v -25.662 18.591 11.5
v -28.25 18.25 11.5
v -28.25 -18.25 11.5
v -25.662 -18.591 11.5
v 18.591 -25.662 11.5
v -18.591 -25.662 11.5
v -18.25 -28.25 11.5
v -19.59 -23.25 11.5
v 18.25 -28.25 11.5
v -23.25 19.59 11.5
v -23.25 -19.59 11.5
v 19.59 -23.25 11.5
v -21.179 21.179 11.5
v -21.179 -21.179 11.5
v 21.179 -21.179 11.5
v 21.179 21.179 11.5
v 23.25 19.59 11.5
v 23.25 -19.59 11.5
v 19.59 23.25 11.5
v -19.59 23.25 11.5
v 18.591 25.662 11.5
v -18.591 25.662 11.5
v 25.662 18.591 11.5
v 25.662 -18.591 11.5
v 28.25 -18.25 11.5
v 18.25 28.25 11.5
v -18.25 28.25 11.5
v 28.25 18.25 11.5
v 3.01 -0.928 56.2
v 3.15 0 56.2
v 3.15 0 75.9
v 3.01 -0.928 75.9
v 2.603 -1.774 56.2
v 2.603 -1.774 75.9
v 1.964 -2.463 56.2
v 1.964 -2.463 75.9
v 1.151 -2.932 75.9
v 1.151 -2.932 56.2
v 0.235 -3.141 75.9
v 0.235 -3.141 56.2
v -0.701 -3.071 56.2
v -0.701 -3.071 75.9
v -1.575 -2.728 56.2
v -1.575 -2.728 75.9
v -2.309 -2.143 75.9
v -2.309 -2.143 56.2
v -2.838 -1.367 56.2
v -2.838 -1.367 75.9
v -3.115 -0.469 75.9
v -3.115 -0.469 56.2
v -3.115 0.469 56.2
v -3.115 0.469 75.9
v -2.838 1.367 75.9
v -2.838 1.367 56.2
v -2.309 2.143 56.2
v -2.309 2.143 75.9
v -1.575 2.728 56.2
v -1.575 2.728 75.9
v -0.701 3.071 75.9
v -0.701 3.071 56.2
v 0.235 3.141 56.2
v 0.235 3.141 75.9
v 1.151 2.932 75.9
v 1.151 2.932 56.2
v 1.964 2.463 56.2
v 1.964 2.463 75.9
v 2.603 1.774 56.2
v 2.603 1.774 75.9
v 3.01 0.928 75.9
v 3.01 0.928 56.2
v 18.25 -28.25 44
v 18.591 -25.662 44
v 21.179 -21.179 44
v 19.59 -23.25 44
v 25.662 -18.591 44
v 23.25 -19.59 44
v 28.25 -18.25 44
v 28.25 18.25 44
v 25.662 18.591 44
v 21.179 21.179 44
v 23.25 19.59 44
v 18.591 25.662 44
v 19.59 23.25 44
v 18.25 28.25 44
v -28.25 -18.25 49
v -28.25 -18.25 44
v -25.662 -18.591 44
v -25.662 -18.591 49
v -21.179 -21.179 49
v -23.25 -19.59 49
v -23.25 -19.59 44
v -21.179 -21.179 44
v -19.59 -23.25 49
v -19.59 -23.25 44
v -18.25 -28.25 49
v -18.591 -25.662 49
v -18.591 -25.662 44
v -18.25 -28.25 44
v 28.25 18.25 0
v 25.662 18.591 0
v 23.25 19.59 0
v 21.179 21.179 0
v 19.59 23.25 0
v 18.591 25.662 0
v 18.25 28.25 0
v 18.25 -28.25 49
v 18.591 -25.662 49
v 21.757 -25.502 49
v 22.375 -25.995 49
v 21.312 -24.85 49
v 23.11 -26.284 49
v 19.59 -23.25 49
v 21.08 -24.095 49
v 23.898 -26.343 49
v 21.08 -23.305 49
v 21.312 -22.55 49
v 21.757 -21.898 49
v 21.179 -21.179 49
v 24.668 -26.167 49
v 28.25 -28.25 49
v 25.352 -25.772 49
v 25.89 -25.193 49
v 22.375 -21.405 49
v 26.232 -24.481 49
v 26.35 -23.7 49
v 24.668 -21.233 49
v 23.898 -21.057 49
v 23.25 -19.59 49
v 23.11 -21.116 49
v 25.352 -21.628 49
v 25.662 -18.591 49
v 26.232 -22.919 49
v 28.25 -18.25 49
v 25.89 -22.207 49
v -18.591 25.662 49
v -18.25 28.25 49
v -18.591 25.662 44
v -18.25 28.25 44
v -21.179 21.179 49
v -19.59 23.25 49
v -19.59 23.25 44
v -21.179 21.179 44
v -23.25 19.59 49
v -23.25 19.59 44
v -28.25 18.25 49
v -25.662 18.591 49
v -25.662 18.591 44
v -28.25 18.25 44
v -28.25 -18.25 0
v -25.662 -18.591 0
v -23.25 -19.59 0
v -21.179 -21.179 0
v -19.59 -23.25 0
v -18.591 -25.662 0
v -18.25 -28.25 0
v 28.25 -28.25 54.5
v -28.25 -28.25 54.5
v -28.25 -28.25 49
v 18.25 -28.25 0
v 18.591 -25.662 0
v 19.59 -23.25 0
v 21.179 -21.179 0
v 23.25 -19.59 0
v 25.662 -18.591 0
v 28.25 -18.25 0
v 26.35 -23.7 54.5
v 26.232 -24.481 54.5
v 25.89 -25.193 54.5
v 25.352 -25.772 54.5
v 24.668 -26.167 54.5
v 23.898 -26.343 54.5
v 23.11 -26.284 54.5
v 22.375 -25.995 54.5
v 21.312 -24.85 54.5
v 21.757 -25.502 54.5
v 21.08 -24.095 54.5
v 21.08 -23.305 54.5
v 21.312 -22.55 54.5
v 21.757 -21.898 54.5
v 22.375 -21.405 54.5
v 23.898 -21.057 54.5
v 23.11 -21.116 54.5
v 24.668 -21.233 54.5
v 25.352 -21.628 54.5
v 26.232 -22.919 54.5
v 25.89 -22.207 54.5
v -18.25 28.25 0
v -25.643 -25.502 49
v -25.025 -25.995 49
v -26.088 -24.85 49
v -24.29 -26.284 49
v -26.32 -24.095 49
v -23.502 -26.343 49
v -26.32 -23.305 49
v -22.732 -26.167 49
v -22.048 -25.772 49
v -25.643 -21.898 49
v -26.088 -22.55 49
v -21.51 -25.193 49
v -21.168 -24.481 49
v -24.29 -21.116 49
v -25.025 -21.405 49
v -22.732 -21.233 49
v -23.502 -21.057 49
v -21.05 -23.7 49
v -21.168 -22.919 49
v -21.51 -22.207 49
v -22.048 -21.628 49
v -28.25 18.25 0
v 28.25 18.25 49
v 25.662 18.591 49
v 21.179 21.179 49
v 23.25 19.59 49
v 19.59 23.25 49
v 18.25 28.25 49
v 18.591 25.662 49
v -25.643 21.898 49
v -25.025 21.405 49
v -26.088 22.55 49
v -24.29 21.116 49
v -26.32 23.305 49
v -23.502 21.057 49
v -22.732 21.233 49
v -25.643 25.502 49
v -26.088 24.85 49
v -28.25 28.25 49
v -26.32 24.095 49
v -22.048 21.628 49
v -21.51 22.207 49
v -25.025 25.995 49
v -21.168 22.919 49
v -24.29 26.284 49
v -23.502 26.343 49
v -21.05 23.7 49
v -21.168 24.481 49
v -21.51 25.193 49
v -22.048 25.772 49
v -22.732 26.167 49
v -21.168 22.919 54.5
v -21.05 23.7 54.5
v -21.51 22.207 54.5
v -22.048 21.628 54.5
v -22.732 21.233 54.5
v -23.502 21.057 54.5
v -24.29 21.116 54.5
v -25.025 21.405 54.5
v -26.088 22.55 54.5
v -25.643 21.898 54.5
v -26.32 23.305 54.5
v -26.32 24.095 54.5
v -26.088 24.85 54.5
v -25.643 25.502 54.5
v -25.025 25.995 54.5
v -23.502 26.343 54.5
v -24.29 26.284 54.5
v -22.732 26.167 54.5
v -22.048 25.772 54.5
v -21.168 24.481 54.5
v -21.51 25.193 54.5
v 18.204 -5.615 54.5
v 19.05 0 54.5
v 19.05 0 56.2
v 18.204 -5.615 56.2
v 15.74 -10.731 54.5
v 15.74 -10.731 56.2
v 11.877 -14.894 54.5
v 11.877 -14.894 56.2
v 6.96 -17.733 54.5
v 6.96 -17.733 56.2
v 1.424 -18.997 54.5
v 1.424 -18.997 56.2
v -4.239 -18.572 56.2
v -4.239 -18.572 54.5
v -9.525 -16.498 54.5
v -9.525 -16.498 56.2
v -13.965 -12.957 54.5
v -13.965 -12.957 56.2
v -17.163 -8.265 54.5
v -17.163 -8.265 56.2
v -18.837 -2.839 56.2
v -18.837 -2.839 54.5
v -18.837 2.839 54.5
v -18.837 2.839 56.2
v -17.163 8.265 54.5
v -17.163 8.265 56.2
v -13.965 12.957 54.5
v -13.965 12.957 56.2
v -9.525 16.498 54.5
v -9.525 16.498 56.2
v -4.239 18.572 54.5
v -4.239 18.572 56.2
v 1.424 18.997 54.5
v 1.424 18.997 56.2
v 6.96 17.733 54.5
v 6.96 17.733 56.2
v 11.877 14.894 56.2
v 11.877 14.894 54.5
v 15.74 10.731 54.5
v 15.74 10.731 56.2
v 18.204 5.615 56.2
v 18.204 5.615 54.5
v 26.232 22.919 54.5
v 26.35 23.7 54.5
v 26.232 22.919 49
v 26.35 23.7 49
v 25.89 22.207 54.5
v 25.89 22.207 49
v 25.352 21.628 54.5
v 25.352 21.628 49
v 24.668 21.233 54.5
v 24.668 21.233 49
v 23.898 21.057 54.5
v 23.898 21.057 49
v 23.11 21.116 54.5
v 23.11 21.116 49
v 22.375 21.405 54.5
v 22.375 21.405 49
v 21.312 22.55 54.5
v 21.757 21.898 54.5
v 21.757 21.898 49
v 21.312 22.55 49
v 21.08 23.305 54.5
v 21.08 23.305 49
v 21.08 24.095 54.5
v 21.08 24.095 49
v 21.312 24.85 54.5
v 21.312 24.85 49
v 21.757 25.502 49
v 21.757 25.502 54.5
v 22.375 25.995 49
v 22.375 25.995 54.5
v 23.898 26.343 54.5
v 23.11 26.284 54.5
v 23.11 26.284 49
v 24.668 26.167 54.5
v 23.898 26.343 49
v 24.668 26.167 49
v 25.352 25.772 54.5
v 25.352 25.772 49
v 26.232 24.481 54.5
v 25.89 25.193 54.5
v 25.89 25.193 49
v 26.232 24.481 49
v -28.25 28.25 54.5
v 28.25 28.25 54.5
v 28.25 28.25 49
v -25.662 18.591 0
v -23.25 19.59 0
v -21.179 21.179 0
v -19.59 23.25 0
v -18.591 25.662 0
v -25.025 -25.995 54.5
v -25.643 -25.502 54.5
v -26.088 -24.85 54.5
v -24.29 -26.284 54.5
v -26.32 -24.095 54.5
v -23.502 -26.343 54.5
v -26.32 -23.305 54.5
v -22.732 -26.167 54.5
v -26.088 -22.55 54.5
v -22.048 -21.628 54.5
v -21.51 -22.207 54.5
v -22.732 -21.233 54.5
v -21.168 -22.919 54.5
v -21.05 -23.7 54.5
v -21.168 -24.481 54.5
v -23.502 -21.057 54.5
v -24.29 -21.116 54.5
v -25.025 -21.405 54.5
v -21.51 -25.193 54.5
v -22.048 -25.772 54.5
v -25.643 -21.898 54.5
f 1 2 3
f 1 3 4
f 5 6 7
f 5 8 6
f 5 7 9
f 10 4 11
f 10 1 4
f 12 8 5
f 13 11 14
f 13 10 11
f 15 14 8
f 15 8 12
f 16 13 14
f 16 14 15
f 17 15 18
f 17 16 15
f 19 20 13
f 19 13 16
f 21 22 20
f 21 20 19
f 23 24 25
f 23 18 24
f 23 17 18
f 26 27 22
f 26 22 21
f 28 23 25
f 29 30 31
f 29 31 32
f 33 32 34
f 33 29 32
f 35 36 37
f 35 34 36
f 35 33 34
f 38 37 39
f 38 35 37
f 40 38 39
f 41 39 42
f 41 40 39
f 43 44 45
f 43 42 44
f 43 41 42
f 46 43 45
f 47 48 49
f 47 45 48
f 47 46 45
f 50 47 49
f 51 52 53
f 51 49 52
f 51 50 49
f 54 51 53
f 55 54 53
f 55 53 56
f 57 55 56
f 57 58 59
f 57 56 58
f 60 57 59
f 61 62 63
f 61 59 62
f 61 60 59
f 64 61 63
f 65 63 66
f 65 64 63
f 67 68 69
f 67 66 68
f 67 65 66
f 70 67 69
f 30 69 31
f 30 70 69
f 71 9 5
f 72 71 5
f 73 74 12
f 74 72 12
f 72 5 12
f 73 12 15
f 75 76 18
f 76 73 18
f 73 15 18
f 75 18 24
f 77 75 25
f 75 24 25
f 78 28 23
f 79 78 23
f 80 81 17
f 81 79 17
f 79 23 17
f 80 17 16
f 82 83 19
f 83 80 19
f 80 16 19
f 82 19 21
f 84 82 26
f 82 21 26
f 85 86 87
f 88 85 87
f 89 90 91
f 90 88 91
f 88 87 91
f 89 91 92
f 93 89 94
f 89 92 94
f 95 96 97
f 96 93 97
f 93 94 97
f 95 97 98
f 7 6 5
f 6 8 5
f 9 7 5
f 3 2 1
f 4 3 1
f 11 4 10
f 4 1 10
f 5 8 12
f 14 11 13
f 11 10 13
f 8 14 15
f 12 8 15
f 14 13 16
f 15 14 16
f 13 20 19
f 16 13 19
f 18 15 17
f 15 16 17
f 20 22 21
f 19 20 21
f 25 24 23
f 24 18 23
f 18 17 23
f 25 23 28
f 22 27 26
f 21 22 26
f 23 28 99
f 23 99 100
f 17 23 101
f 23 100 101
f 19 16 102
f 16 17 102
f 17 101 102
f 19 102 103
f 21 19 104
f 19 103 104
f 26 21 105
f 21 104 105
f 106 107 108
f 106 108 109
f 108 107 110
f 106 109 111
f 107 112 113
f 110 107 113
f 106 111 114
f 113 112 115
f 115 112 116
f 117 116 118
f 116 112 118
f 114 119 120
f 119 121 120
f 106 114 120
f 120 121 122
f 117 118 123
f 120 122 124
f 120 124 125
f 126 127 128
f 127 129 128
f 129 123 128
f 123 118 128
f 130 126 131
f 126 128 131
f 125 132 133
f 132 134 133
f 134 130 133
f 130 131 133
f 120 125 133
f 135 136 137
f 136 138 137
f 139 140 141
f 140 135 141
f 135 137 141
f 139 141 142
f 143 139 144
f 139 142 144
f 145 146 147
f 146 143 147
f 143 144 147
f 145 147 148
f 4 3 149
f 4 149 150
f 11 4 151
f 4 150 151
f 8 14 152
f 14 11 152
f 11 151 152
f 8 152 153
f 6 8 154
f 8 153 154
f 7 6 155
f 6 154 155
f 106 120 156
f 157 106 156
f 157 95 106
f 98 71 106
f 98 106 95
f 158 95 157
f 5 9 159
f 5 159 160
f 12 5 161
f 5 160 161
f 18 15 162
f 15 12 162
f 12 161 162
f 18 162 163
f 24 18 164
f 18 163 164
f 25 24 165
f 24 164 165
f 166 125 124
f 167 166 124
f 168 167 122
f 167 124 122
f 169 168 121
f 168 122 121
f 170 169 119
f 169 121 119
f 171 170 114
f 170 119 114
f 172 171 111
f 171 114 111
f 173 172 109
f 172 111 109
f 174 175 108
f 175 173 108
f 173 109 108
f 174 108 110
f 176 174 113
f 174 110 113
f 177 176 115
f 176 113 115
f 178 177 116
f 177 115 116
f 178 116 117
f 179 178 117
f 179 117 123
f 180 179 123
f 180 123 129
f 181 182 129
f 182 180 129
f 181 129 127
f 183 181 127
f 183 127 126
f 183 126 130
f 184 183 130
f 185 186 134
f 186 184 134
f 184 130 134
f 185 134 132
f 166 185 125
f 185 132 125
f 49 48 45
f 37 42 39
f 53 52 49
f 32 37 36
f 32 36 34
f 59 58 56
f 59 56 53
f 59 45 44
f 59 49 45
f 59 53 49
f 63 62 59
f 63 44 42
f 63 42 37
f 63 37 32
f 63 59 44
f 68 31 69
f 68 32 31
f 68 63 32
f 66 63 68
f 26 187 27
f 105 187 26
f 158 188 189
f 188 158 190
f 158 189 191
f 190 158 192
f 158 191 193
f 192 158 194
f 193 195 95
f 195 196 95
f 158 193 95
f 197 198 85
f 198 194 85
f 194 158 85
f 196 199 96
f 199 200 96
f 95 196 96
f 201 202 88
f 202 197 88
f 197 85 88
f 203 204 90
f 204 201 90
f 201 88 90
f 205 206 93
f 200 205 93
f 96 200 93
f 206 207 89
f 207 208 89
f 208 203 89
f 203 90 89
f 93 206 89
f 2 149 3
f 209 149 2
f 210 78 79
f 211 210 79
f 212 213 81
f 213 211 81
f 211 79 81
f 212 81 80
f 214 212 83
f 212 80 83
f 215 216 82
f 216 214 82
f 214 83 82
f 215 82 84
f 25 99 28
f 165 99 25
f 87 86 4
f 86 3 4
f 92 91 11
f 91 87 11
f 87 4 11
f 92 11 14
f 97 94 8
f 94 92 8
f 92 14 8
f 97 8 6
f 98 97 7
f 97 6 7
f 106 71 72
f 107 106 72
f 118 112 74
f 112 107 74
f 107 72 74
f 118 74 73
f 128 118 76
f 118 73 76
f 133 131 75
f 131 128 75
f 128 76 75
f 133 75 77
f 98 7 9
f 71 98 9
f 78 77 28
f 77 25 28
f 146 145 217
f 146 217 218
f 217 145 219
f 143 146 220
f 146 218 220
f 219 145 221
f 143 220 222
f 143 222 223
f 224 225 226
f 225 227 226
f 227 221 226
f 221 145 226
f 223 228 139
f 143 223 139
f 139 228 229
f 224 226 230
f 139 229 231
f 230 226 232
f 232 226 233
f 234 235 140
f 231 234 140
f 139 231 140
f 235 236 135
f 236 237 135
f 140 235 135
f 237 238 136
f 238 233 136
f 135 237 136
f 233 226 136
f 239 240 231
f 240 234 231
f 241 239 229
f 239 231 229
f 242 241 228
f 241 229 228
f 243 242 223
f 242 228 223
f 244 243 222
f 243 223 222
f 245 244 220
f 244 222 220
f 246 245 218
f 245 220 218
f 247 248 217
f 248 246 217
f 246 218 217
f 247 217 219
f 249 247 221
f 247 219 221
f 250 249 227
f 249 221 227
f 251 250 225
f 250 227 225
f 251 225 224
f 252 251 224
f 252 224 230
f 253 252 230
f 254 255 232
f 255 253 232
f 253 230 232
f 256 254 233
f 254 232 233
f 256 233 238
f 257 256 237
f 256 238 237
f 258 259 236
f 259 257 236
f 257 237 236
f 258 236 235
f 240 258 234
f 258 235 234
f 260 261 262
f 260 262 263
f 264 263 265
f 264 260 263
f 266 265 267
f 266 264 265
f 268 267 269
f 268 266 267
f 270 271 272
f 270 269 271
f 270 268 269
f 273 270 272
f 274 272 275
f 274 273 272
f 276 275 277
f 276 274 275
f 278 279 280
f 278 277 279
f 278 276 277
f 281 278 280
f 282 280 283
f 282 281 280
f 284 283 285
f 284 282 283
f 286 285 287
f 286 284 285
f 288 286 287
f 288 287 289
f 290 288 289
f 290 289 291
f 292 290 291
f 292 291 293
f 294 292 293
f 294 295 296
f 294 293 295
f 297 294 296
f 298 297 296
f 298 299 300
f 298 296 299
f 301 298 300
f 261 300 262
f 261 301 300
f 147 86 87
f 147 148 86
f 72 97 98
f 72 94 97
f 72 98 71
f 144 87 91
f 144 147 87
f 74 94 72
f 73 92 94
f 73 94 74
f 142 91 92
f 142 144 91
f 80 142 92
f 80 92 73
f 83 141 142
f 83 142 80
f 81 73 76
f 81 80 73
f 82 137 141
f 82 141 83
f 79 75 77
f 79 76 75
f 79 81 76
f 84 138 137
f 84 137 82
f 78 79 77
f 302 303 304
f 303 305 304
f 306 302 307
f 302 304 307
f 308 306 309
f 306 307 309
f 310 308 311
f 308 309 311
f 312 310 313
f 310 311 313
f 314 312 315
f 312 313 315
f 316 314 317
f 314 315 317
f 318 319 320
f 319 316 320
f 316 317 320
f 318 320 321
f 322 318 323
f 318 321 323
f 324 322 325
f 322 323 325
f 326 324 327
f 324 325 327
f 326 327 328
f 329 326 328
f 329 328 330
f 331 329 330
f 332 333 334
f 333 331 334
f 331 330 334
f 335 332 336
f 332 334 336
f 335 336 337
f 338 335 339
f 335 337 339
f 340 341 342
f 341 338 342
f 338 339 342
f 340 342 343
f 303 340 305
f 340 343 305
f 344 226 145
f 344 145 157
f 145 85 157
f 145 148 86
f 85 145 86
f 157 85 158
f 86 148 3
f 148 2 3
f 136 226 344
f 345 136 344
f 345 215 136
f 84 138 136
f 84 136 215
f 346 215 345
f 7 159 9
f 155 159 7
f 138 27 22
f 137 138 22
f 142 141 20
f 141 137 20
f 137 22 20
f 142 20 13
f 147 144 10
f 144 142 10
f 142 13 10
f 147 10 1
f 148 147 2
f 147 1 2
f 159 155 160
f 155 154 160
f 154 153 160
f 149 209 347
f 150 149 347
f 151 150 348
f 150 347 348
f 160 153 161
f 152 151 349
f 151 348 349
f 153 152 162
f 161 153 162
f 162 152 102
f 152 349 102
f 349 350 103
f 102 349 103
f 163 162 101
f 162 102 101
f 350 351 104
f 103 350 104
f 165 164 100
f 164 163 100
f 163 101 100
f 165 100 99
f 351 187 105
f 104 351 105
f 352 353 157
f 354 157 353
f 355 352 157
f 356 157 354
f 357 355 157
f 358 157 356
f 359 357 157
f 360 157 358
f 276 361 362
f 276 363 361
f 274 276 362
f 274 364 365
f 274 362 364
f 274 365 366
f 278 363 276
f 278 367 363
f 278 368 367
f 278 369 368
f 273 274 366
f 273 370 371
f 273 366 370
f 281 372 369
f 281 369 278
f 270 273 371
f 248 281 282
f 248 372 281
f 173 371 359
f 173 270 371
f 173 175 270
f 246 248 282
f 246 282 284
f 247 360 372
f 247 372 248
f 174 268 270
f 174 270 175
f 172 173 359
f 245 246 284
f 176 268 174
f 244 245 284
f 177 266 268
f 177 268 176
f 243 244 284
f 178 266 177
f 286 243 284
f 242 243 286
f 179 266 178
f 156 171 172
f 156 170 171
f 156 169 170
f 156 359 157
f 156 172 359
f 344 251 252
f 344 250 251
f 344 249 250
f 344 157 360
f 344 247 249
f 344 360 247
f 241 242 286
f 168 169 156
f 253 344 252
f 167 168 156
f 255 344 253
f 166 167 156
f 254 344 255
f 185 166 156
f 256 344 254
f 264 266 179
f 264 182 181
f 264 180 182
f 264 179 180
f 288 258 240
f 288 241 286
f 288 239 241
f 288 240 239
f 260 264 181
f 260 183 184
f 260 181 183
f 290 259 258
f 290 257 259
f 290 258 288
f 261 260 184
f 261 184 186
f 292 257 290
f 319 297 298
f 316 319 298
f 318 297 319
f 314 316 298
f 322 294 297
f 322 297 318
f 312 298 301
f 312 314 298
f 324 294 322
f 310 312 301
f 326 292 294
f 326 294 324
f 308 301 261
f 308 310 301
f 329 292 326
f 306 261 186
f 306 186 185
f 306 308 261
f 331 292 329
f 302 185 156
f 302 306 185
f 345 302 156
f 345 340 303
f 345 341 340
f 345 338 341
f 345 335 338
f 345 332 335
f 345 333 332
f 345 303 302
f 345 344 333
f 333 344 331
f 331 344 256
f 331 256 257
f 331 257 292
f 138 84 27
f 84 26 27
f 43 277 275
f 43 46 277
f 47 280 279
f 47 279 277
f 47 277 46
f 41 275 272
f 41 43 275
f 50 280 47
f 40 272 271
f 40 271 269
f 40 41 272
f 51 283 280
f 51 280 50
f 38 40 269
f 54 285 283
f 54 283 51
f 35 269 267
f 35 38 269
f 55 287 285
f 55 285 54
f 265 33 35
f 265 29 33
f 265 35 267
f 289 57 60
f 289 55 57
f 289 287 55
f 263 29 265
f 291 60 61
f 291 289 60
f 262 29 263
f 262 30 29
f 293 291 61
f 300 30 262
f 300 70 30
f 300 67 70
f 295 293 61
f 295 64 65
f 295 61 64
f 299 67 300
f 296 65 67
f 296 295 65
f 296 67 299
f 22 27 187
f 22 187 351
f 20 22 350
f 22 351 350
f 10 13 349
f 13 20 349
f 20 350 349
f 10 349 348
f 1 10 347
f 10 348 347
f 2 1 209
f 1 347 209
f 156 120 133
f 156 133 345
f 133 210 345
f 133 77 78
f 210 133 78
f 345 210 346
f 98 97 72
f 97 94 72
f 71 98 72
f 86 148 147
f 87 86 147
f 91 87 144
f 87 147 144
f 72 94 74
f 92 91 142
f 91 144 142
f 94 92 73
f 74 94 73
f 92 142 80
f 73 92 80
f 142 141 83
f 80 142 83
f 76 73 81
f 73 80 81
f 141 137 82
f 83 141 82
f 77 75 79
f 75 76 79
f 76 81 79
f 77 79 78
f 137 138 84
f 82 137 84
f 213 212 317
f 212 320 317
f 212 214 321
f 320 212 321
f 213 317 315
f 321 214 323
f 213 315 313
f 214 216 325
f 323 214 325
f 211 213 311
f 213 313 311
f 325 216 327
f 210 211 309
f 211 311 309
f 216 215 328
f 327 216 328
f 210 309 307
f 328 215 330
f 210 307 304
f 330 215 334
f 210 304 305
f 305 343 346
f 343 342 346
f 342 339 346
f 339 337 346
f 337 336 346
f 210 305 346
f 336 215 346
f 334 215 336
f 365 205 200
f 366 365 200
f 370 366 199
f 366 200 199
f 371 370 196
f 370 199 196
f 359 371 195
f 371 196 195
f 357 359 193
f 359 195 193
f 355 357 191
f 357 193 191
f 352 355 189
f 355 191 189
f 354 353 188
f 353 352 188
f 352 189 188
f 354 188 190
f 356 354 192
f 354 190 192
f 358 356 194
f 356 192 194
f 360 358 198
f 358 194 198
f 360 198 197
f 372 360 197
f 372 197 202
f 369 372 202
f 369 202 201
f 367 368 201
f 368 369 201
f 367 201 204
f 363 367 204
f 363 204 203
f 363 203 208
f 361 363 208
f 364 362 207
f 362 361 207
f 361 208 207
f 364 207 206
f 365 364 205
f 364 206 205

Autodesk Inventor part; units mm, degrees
ref_plane "YZ Plane" through (0, 0, 0) normal (1, 0, 0) x (0, 1, 0)
ref_plane "XZ Plane" through (0, 0, 0) normal (0, 1, 0) x (-1, 0, 0)
ref_plane "XY Plane" through (0, 0, 0) normal (0, 0, 1) x (1, 0, 0)
sketch "Sketch1" plane through (0, 0, 0) normal (0, 0, 1) x (1, 0, 0)
  line L0 (18.25, -28.25) -> (-18.25, -28.25)
  line L1 (-28.25, -18.25) -> (-28.25, 18.25)
  line L2 (-18.25, 28.25) -> (18.25, 28.25)
  line L3 (28.25, 18.25) -> (28.25, -18.25)
  line L4 (28.25, -28.25) -> (-28.25, 28.25) construction
  line L5 (-28.25, -28.25) -> (28.25, 28.25) construction
  arc A0 (-28.25, 18.25) -> (-18.25, 28.25) centre (-28.25, 28.25) ccw
  arc A1 (18.25, 28.25) -> (28.25, 18.25) centre (28.25, 28.25) ccw
  arc A2 (-18.25, -28.25) -> (-28.25, -18.25) centre (-28.25, -28.25) ccw
  arc A3 (28.25, -18.25) -> (18.25, -28.25) centre (28.25, -28.25) ccw
  point P0 (0, 0)
  dimension "d0" = 56.5
  dimension "d1" = 56.5
  dimension "d2" = 20
  dimension "d3" = 20
  dimension "d4" = 20
  dimension "d5" = 20
  dimension "d6" = 56.5
  dimension "d7" = 56.5
  dimension "d8" = 56.5
  dimension "d9" = 56.5
  dimension "d10" = 28.25
  dimension "d11" = 28.25
  dimension "d12" = 28.25
  dimension "d13" = 28.25
extrude "Extrusion1" add sketch "Sketch1" along normal blind 11.5
sketch "Sketch2" plane through (0, 0, 11.5) normal (0, 0, 1) x (1, 0, 0)
  line L0 (18.25, 28.25) -> (-18.25, 28.25) projected
  arc A0 (-28.25, 18.25) -> (-18.25, 28.25) centre (-28.25, 28.25) ccw projected
  line L1 (-28.25, 18.25) -> (-28.25, -18.25) projected
  arc A1 (-18.25, -28.25) -> (-28.25, -18.25) centre (-28.25, -28.25) ccw projected
  line L2 (-18.25, -28.25) -> (18.25, -28.25) projected
  arc A2 (28.25, -18.25) -> (18.25, -28.25) centre (28.25, -28.25) ccw projected
  line L3 (28.25, -18.25) -> (28.25, 18.25) projected
  arc A3 (18.25, 28.25) -> (28.25, 18.25) centre (28.25, 28.25) ccw projected
  point P0 (0, 0)
extrude "Extrusion2" add sketch "Sketch2" along normal blind 32.5 separate body
sketch "Sketch3" plane through (0, 0, 44) normal (0, 0, 1) x (1, 0, 0)
  line L0 (18.25, 28.25) -> (-18.25, 28.25) projected
  arc A0 (-28.25, 18.25) -> (-18.25, 28.25) centre (-28.25, 28.25) ccw projected
  line L1 (-28.25, 18.25) -> (-28.25, -18.25) projected
  arc A1 (-18.25, -28.25) -> (-28.25, -18.25) centre (-28.25, -28.25) ccw projected
  line L2 (-18.25, -28.25) -> (18.25, -28.25) projected
  arc A2 (28.25, -18.25) -> (18.25, -28.25) centre (28.25, -28.25) ccw projected
  line L3 (28.25, -18.25) -> (28.25, 18.25) projected
  arc A3 (18.25, 28.25) -> (28.25, 18.25) centre (28.25, 28.25) ccw projected
  point P0 (0, 0)
extrude "Extrusion3" add sketch "Sketch3" along normal blind 5 separate body
sketch "Sketch4" plane through (0, 0, 49) normal (0, 0, 1) x (1, 0, 0)
  line L0 (18.25, 28.25) -> (-18.25, 28.25) projected
  arc A0 (-28.25, 18.25) -> (-18.25, 28.25) centre (-28.25, 28.25) ccw projected
  line L1 (-28.25, 18.25) -> (-28.25, -18.25) projected
  arc A1 (-18.25, -28.25) -> (-28.25, -18.25) centre (-28.25, -28.25) ccw projected
  line L2 (-18.25, -28.25) -> (18.25, -28.25) projected
  arc A2 (28.25, -18.25) -> (18.25, -28.25) centre (28.25, -28.25) ccw projected
  line L3 (28.25, -18.25) -> (28.25, 18.25) projected
  arc A3 (18.25, 28.25) -> (28.25, 18.25) centre (28.25, 28.25) ccw projected
  line L4 (-28.25, 28.25) -> (28.25, 28.25)
  line L5 (28.25, 28.25) -> (28.25, -28.25)
  line L6 (28.25, -28.25) -> (-28.25, -28.25)
  line L7 (-28.25, -28.25) -> (-28.25, 28.25)
  circle A4 centre (-23.7, -23.7) radius 2.65
  circle A5 centre (23.7, -23.7) radius 2.65
  circle A6 centre (-23.7, 23.7) radius 2.65
  circle A7 centre (23.7, 23.7) radius 2.65
  point P0 (0, 0)
  dimension "d22" = 5.3
  dimension "d24" = 1.9
  dimension "d25" = 1.9
  dimension "d28" = 47.4
  dimension "d31" = 47.4
extrude "Extrusion4" add sketch "Sketch4" along normal blind 5.5 bodies 3
sketch "Sketch5" plane through (0, 0, 54.5) normal (0, 0, 1) x (1, 0, 0)
  circle A0 centre (0, 0) radius 19.05
  circle A1 centre (0, 0) radius 3.15
  dimension "d36" = 38.1
  dimension "d37" = 6.3
extrude "Extrusion5" add sketch "Sketch5" along normal blind 1.7 bodies 3
extrude "Extrusion6" add sketch "Sketch5" along normal blind 21.4 contours A1 bodies 3
properties part number "NEMA 23"
